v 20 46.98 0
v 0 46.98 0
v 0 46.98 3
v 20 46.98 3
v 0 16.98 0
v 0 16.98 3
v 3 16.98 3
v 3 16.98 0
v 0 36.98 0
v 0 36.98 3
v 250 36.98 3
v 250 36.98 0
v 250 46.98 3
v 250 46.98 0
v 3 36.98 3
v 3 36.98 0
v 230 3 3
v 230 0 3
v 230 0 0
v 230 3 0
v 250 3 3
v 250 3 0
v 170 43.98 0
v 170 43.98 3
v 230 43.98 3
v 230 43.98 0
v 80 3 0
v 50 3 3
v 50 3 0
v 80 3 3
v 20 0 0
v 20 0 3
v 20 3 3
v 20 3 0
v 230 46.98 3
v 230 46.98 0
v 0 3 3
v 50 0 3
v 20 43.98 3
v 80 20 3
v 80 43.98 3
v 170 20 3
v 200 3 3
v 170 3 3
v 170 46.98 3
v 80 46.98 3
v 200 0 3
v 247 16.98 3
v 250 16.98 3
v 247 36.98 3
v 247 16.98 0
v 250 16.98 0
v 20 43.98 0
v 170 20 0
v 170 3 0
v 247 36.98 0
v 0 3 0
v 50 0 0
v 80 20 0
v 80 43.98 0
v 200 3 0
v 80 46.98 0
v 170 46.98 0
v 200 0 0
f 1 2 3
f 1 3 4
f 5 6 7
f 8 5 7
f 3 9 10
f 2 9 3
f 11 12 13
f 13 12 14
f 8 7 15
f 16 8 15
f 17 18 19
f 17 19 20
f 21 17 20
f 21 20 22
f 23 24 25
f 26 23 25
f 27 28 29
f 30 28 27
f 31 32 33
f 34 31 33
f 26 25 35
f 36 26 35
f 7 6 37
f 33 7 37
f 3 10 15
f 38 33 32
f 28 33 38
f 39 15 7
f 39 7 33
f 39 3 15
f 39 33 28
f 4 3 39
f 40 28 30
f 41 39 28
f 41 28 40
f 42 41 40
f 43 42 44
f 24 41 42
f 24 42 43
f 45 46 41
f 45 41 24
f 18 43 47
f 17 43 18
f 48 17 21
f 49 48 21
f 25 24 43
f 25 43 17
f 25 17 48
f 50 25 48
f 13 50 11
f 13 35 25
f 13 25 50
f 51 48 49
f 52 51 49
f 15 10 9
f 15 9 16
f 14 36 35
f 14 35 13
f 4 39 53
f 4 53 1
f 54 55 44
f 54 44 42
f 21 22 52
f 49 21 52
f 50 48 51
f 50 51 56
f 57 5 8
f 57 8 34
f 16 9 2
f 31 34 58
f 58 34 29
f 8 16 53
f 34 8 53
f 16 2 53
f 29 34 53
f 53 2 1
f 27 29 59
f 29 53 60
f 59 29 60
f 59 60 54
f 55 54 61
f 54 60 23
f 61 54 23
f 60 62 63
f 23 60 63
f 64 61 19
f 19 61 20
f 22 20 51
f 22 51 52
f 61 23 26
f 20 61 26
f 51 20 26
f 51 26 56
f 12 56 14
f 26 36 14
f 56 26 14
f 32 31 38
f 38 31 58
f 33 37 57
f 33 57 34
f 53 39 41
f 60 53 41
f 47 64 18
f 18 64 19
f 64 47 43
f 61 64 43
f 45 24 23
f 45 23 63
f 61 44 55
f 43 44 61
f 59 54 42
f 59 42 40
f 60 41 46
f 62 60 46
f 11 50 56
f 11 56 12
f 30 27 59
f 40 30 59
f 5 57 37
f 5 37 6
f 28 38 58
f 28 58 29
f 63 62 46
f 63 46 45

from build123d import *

# Parameters (mm, degrees)
SKETCH1_W           = 250
SKETCH1_H           = 46.98
BOSS_EXTRUDE1_DEPTH = 3
SKETCH2_W           = 3
SKETCH2_H           = 20
CUT_EXTRUDE1_DEPTH  = 255.393632782
SKETCH3_W           = 60
SKETCH3_H           = 3
CUT_EXTRUDE2_DEPTH  = 255.393632782
CUT_EXTRUDE3_REACH  = 256.394
SKETCH4_W           = 90
SKETCH4_H           = 20
SKETCH6_W           = 20
SKETCH6_H           = 3
SKETCH6_W_2         = 30
CUT_EXTRUDE5_DEPTH  = 10


with BuildPart() as part:
    # Sketch1 → Boss-Extrude1 (new body)
    with BuildSketch(Plane.XY):
        with Locations((125, 23.49)):
            Rectangle(SKETCH1_W, SKETCH1_H)
    extrude(amount=BOSS_EXTRUDE1_DEPTH)

    # Sketch2 → Cut-Extrude1 (cut, through all)
    with BuildSketch(Plane.XY.offset(3)):
        with Locations((248.5, 26.98)):
            Rectangle(SKETCH2_W, SKETCH2_H)
        with Locations((1.5, 26.98)):
            Rectangle(SKETCH2_W, SKETCH2_H)
    extrude(amount=-CUT_EXTRUDE1_DEPTH, mode=Mode.SUBTRACT)

    # Sketch3 → Cut-Extrude2 (cut, through all)
    with BuildSketch(Plane.XY.offset(3)):
        with Locations((50, 45.48)):
            Rectangle(SKETCH3_W, SKETCH3_H)
        with Locations((200, 45.48)):
            Rectangle(SKETCH3_W, SKETCH3_H)
    extrude(amount=-CUT_EXTRUDE2_DEPTH, mode=Mode.SUBTRACT)

    # Sketch4 → Cut-Extrude3 (cut, up to next)
    with BuildSketch(Plane(origin=(0, 0, 0), x_dir=(-1, 0, 0), z_dir=(0, 0, -1)), mode=Mode.PRIVATE) as cut_extrude3_sk1:
        with Locations((-125, 10)):
            Rectangle(SKETCH4_W, SKETCH4_H)
    cut_extrude3_tool1 = extrude(cut_extrude3_sk1.sketch, amount=-CUT_EXTRUDE3_REACH, mode=Mode.PRIVATE) & part.part
    add(cut_extrude3_tool1.solids().sort_by_distance((125, 10, 0))[0], mode=Mode.SUBTRACT)

    # Sketch6 → Cut-Extrude5 (cut)
    with BuildSketch(Plane.XY.offset(3)):
        with Locations((10, 1.5)):
            Rectangle(SKETCH6_W, SKETCH6_H)
        with Locations((65, 1.5)):
            Rectangle(SKETCH6_W_2, SKETCH6_H)
        with Locations((240, 1.5)):
            Rectangle(SKETCH6_W, SKETCH6_H)
        with Locations((185, 1.5)):
            Rectangle(SKETCH6_W_2, SKETCH6_H)
    extrude(amount=-CUT_EXTRUDE5_DEPTH, mode=Mode.SUBTRACT)


solid = part.part
